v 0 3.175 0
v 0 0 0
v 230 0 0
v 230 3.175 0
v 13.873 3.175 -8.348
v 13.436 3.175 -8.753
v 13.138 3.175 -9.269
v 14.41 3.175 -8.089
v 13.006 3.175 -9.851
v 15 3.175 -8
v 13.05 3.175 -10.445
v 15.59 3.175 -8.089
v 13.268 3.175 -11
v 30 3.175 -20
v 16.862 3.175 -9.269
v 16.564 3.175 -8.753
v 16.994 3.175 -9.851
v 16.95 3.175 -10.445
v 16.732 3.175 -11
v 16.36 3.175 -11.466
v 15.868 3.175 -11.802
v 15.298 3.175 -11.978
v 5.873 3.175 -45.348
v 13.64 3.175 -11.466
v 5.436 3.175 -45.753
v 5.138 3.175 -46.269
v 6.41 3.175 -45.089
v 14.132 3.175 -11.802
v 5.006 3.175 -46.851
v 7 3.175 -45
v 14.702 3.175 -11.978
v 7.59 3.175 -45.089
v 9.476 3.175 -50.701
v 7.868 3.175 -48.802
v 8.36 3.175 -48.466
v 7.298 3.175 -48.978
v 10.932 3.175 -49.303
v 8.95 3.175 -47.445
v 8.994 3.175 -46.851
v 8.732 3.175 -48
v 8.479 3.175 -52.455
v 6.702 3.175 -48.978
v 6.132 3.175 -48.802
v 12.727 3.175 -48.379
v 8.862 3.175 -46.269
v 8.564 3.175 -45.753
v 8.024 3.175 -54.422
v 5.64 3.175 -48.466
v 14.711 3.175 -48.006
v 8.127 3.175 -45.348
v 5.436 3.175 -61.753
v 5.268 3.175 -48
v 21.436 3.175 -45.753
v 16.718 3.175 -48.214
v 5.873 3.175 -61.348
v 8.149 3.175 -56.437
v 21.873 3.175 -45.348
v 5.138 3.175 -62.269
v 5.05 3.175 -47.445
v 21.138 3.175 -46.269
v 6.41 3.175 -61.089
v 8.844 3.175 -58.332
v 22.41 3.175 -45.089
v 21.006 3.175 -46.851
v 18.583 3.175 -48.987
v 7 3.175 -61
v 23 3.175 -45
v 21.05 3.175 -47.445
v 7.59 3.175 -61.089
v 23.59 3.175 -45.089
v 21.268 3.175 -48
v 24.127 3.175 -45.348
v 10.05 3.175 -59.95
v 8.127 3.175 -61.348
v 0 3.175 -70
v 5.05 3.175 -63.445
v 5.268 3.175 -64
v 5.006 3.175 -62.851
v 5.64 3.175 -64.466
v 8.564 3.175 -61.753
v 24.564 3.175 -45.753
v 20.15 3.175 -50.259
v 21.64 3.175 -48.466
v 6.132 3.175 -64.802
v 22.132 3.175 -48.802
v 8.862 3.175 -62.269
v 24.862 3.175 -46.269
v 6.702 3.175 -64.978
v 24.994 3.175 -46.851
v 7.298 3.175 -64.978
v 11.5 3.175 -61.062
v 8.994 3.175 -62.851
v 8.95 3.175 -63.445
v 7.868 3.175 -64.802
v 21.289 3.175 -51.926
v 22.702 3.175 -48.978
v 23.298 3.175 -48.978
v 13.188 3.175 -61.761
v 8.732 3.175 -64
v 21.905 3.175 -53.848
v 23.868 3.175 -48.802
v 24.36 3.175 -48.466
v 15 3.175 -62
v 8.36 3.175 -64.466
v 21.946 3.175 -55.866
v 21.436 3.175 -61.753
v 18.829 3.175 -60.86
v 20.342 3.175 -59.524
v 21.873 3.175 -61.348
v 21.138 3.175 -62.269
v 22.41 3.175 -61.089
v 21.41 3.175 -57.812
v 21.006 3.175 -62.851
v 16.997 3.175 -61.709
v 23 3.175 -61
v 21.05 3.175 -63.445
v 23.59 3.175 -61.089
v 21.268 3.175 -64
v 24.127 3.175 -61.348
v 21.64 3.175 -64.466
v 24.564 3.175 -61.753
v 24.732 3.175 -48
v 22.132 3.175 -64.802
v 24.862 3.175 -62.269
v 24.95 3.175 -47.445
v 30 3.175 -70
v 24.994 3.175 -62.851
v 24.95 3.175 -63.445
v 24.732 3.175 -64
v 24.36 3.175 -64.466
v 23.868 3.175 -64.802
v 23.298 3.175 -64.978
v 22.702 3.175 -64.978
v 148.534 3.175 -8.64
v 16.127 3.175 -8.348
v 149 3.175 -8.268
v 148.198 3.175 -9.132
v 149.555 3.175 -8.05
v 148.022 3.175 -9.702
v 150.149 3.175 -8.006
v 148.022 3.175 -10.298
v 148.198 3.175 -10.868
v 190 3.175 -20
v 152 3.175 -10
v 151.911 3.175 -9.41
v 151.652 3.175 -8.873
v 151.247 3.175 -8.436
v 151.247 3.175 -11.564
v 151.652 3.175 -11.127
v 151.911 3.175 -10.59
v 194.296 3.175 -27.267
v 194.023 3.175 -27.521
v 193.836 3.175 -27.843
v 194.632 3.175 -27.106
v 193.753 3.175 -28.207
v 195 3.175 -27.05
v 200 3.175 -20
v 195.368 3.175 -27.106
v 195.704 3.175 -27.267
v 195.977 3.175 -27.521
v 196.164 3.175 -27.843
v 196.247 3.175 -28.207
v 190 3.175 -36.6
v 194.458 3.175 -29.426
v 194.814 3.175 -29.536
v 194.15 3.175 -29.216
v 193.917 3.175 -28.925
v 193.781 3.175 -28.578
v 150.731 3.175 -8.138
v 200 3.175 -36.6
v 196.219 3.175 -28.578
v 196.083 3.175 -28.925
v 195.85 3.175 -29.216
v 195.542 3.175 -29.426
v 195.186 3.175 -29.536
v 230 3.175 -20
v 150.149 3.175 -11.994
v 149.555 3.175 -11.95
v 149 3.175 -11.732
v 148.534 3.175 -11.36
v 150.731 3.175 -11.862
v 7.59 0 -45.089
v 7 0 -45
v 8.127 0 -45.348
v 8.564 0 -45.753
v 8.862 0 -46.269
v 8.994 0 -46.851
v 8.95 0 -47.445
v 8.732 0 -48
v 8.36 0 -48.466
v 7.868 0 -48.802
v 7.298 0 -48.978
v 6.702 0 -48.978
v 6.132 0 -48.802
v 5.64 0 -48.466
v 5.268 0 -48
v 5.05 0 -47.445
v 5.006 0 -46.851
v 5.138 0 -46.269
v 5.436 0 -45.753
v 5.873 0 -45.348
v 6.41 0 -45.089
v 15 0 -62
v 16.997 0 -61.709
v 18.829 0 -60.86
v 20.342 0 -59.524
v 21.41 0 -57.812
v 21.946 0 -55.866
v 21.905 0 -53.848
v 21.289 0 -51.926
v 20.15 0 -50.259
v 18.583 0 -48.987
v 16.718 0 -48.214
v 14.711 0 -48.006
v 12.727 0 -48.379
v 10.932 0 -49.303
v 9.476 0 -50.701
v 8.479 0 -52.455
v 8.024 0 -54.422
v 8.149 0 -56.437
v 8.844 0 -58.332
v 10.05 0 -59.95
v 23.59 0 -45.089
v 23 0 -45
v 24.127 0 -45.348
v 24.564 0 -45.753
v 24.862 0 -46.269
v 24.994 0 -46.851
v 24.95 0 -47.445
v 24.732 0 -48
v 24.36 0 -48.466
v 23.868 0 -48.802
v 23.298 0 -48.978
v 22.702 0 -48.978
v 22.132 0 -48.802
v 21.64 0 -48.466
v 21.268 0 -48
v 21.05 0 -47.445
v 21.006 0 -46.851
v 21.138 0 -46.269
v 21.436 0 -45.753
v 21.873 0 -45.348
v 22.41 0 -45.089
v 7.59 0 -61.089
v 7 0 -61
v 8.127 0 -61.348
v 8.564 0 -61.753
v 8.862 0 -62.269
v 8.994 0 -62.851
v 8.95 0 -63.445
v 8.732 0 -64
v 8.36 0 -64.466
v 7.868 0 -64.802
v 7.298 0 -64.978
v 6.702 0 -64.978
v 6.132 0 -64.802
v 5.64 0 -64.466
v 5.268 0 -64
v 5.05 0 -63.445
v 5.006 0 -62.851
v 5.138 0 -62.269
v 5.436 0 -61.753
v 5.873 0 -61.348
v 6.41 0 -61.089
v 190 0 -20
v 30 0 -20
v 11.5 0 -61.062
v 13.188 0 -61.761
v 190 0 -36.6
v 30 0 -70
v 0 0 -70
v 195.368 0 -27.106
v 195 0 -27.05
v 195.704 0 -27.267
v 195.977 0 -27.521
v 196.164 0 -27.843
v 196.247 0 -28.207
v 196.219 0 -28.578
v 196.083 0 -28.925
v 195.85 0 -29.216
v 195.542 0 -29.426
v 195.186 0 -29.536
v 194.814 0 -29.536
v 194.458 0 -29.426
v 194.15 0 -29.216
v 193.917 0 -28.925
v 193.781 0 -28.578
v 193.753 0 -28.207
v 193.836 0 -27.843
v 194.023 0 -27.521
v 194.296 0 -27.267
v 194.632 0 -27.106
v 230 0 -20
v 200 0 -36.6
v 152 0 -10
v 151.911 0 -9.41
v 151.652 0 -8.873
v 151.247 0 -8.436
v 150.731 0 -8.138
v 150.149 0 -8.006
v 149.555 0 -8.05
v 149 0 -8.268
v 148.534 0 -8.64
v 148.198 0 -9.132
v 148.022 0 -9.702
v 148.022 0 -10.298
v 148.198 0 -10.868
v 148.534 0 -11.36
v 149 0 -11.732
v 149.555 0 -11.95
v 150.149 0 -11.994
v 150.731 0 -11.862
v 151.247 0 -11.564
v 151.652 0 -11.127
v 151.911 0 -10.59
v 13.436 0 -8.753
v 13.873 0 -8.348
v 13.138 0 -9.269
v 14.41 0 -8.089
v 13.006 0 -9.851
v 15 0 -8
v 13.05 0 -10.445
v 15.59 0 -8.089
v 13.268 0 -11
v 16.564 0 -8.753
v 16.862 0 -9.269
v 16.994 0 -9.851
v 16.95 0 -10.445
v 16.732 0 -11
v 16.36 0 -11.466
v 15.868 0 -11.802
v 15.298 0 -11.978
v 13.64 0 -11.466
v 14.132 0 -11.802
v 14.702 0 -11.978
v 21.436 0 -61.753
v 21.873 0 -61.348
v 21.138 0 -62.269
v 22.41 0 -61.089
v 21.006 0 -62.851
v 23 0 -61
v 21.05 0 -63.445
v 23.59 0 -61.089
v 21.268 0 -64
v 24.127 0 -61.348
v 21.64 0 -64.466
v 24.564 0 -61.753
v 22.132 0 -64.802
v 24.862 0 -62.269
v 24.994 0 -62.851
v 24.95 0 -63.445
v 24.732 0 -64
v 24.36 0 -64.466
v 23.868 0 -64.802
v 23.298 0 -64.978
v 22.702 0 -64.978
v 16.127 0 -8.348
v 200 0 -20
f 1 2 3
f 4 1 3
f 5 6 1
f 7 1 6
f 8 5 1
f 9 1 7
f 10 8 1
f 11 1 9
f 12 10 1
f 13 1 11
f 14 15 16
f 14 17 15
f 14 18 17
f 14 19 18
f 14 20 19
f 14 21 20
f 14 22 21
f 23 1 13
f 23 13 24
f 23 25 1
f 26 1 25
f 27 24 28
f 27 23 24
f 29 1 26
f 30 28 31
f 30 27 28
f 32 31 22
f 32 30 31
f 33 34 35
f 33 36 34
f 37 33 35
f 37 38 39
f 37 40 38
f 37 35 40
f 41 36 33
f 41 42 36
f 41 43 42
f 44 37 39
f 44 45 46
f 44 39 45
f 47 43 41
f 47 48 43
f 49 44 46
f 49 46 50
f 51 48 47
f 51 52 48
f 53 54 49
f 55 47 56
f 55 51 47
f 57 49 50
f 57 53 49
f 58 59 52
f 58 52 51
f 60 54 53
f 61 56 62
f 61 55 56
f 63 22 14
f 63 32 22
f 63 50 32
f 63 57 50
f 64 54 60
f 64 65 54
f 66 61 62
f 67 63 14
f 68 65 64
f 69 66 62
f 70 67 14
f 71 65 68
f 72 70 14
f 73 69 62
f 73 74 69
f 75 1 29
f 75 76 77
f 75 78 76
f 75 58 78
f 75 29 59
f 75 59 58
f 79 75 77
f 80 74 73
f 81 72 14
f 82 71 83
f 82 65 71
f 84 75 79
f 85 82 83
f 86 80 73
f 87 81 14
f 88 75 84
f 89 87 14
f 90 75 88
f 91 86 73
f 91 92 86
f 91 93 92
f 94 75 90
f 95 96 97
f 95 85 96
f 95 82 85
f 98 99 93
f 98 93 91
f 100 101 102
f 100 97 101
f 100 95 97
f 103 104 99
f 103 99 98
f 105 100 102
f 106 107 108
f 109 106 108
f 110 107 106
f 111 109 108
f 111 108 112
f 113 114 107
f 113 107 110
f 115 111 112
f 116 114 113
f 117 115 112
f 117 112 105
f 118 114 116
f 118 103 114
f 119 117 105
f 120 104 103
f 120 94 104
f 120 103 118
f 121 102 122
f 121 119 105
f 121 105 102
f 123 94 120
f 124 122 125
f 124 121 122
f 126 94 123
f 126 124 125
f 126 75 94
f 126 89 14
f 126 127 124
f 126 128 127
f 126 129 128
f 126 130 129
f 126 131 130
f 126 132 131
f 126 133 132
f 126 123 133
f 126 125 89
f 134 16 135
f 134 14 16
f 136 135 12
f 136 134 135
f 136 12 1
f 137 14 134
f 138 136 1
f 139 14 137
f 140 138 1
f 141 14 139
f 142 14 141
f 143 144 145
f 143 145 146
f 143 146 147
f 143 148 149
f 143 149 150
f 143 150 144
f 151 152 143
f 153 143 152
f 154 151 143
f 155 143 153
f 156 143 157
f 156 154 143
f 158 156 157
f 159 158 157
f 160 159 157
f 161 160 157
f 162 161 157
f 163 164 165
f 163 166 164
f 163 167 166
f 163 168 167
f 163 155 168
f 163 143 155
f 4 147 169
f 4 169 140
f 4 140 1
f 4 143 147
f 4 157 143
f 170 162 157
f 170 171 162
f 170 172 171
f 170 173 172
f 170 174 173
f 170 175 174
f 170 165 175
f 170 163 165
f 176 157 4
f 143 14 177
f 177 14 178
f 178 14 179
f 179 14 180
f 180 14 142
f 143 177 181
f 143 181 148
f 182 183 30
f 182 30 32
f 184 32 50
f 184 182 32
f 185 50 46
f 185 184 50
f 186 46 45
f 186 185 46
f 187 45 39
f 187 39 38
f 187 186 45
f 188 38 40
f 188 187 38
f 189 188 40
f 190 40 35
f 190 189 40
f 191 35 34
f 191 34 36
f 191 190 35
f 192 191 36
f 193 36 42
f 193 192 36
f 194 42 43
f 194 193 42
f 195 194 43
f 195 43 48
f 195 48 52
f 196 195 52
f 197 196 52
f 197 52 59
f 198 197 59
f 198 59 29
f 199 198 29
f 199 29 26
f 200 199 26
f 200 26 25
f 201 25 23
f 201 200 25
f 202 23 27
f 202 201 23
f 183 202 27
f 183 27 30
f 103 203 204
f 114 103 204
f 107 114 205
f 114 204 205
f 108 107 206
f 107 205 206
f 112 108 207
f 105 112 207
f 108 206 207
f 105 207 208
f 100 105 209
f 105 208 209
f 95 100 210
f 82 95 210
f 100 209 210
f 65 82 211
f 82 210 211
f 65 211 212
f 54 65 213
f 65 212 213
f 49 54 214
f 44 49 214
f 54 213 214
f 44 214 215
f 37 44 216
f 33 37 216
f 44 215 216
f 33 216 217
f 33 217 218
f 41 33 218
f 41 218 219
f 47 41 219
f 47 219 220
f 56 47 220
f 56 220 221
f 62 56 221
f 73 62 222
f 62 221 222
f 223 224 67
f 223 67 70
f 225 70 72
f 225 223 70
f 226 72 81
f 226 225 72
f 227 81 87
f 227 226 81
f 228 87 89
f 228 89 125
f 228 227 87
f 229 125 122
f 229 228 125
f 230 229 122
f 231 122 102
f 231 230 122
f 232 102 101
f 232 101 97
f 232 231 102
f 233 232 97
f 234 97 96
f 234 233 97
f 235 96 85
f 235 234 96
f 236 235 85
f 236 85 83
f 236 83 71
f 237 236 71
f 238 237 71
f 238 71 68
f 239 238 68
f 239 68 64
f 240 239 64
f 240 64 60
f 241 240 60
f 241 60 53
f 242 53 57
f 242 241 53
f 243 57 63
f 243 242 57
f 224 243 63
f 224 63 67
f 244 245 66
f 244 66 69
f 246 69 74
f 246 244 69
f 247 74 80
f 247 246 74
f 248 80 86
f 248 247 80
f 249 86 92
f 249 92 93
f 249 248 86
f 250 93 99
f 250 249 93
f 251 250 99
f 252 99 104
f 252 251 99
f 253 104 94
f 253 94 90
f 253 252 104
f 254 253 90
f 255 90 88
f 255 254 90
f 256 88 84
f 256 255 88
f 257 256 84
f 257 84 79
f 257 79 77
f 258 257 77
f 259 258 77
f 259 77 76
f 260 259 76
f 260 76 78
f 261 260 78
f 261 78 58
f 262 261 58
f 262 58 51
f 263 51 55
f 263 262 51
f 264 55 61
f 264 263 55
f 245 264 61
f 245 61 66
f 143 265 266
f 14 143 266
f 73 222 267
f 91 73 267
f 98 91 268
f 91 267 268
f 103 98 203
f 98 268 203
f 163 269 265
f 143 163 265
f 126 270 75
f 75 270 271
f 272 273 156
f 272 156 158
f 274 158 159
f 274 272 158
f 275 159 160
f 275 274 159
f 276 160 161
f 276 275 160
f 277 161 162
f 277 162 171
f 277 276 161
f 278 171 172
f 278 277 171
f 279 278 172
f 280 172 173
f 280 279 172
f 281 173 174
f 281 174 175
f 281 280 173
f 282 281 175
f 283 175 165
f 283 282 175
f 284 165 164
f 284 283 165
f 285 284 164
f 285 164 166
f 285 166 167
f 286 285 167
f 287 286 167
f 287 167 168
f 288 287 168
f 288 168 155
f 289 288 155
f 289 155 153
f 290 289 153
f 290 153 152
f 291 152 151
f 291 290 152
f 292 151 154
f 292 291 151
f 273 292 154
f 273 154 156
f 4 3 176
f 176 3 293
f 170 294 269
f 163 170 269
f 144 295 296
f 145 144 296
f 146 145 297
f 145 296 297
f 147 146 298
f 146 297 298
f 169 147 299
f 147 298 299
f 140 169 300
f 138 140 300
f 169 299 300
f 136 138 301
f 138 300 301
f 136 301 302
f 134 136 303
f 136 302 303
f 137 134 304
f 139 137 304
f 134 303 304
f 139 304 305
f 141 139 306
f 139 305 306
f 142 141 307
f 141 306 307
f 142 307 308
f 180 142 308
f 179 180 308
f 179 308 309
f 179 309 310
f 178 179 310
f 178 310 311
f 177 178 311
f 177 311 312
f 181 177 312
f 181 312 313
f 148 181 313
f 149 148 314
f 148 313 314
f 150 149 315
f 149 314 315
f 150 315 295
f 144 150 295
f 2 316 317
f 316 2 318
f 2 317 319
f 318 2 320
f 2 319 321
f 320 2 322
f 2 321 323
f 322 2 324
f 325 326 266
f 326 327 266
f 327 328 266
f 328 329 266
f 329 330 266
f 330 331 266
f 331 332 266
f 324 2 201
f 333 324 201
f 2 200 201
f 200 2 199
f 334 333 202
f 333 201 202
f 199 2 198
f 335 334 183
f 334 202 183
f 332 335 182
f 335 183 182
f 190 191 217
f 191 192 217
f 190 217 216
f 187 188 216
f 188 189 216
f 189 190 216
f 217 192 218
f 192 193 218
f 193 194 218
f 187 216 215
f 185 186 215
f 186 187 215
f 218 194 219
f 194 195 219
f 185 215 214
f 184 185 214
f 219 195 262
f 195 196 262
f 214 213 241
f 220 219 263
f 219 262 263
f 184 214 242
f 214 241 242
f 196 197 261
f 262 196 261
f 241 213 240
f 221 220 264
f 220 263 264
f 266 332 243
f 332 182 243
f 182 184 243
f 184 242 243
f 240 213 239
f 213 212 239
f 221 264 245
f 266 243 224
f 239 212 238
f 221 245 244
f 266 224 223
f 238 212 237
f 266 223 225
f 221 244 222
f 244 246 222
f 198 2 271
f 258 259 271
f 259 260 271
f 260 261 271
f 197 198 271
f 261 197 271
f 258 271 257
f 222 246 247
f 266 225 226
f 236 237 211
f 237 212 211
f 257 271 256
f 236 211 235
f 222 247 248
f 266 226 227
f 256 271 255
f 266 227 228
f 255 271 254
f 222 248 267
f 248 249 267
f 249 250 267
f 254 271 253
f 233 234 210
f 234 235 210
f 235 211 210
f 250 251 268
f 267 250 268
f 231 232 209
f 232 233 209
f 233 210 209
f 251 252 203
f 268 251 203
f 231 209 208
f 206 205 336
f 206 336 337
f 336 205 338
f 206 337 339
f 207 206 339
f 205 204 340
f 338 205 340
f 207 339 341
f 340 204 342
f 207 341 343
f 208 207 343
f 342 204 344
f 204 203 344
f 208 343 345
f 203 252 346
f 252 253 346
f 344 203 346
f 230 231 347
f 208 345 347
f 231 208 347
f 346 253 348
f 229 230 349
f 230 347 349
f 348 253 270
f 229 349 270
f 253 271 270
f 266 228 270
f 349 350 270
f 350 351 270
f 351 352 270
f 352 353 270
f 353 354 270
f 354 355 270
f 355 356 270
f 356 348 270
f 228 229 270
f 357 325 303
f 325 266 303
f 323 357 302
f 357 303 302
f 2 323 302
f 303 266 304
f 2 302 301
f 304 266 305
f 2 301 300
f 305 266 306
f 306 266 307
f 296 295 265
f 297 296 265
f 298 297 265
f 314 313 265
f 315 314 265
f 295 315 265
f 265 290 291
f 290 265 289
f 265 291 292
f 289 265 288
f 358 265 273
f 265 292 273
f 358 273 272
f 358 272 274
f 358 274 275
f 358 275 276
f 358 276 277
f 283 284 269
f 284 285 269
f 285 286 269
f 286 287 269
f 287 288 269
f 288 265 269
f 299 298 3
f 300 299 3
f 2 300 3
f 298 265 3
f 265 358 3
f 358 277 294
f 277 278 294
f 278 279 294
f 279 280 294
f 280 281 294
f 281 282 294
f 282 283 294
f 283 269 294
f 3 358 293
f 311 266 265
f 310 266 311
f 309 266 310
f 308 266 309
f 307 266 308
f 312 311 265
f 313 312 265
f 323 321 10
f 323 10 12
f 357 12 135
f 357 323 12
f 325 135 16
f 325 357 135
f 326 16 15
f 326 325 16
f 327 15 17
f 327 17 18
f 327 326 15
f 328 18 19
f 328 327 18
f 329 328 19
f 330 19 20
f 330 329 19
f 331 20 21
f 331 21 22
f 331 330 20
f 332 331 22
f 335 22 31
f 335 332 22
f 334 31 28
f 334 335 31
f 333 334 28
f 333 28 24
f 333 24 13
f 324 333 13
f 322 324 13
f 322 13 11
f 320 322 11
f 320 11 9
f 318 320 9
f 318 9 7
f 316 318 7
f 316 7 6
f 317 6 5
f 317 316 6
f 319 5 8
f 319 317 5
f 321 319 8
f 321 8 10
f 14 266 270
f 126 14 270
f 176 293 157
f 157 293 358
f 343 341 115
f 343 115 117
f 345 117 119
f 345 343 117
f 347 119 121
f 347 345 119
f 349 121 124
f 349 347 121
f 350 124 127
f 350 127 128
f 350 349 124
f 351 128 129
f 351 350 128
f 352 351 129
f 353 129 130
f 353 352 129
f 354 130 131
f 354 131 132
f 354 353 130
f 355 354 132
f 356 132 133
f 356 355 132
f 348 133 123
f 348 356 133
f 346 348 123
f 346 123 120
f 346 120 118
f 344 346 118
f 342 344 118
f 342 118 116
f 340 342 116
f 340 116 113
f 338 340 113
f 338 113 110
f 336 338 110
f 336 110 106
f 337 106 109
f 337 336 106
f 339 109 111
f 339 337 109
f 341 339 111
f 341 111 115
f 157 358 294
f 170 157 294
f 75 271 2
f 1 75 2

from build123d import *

# Parameters (mm, degrees)
SKETCH1_R           = 2
SKETCH1_R_2         = 1.25
BOSS_EXTRUDE1_DEPTH = 3.175


with BuildPart() as part:
    # Sketch1 → Boss-Extrude1 (new body)
    with BuildSketch(Plane(origin=(0, 0, 0), x_dir=(1, 0, 0), z_dir=(0, 1, 0))):
        Polygon((230, 0), (230, 10), (230, 20), (200, 20), (200, 36.6), (195, 36.6), (190, 36.6), (190, 20), (30, 20), (30, 70), (15, 70), (0, 70), (0, 0), align=None)
        with Locations((15, 10)):
            Circle(SKETCH1_R, mode=Mode.SUBTRACT)
        with BuildLine():
            ThreePointArc((148, 10), (150, 12), (152, 10))
            ThreePointArc((152, 10), (150, 8), (148, 10))
        make_face(mode=Mode.SUBTRACT)
        with Locations((7, 47)):
            Circle(SKETCH1_R, mode=Mode.SUBTRACT)
        with Locations((23, 47)):
            Circle(SKETCH1_R, mode=Mode.SUBTRACT)
        with BuildLine():
            ThreePointArc((10.050252532, 59.949747468), (12.321215973, 61.467156728), (15, 62))
            ThreePointArc((15, 62), (17.678784027, 48.532843272), (10.050252532, 59.949747468))
        make_face(mode=Mode.SUBTRACT)
        with Locations((7, 63)):
            Circle(SKETCH1_R, mode=Mode.SUBTRACT)
        with Locations((23, 63)):
            Circle(SKETCH1_R, mode=Mode.SUBTRACT)
        with Locations((195, 28.3)):
            Circle(SKETCH1_R_2, mode=Mode.SUBTRACT)
    extrude(amount=BOSS_EXTRUDE1_DEPTH)


solid = part.part
